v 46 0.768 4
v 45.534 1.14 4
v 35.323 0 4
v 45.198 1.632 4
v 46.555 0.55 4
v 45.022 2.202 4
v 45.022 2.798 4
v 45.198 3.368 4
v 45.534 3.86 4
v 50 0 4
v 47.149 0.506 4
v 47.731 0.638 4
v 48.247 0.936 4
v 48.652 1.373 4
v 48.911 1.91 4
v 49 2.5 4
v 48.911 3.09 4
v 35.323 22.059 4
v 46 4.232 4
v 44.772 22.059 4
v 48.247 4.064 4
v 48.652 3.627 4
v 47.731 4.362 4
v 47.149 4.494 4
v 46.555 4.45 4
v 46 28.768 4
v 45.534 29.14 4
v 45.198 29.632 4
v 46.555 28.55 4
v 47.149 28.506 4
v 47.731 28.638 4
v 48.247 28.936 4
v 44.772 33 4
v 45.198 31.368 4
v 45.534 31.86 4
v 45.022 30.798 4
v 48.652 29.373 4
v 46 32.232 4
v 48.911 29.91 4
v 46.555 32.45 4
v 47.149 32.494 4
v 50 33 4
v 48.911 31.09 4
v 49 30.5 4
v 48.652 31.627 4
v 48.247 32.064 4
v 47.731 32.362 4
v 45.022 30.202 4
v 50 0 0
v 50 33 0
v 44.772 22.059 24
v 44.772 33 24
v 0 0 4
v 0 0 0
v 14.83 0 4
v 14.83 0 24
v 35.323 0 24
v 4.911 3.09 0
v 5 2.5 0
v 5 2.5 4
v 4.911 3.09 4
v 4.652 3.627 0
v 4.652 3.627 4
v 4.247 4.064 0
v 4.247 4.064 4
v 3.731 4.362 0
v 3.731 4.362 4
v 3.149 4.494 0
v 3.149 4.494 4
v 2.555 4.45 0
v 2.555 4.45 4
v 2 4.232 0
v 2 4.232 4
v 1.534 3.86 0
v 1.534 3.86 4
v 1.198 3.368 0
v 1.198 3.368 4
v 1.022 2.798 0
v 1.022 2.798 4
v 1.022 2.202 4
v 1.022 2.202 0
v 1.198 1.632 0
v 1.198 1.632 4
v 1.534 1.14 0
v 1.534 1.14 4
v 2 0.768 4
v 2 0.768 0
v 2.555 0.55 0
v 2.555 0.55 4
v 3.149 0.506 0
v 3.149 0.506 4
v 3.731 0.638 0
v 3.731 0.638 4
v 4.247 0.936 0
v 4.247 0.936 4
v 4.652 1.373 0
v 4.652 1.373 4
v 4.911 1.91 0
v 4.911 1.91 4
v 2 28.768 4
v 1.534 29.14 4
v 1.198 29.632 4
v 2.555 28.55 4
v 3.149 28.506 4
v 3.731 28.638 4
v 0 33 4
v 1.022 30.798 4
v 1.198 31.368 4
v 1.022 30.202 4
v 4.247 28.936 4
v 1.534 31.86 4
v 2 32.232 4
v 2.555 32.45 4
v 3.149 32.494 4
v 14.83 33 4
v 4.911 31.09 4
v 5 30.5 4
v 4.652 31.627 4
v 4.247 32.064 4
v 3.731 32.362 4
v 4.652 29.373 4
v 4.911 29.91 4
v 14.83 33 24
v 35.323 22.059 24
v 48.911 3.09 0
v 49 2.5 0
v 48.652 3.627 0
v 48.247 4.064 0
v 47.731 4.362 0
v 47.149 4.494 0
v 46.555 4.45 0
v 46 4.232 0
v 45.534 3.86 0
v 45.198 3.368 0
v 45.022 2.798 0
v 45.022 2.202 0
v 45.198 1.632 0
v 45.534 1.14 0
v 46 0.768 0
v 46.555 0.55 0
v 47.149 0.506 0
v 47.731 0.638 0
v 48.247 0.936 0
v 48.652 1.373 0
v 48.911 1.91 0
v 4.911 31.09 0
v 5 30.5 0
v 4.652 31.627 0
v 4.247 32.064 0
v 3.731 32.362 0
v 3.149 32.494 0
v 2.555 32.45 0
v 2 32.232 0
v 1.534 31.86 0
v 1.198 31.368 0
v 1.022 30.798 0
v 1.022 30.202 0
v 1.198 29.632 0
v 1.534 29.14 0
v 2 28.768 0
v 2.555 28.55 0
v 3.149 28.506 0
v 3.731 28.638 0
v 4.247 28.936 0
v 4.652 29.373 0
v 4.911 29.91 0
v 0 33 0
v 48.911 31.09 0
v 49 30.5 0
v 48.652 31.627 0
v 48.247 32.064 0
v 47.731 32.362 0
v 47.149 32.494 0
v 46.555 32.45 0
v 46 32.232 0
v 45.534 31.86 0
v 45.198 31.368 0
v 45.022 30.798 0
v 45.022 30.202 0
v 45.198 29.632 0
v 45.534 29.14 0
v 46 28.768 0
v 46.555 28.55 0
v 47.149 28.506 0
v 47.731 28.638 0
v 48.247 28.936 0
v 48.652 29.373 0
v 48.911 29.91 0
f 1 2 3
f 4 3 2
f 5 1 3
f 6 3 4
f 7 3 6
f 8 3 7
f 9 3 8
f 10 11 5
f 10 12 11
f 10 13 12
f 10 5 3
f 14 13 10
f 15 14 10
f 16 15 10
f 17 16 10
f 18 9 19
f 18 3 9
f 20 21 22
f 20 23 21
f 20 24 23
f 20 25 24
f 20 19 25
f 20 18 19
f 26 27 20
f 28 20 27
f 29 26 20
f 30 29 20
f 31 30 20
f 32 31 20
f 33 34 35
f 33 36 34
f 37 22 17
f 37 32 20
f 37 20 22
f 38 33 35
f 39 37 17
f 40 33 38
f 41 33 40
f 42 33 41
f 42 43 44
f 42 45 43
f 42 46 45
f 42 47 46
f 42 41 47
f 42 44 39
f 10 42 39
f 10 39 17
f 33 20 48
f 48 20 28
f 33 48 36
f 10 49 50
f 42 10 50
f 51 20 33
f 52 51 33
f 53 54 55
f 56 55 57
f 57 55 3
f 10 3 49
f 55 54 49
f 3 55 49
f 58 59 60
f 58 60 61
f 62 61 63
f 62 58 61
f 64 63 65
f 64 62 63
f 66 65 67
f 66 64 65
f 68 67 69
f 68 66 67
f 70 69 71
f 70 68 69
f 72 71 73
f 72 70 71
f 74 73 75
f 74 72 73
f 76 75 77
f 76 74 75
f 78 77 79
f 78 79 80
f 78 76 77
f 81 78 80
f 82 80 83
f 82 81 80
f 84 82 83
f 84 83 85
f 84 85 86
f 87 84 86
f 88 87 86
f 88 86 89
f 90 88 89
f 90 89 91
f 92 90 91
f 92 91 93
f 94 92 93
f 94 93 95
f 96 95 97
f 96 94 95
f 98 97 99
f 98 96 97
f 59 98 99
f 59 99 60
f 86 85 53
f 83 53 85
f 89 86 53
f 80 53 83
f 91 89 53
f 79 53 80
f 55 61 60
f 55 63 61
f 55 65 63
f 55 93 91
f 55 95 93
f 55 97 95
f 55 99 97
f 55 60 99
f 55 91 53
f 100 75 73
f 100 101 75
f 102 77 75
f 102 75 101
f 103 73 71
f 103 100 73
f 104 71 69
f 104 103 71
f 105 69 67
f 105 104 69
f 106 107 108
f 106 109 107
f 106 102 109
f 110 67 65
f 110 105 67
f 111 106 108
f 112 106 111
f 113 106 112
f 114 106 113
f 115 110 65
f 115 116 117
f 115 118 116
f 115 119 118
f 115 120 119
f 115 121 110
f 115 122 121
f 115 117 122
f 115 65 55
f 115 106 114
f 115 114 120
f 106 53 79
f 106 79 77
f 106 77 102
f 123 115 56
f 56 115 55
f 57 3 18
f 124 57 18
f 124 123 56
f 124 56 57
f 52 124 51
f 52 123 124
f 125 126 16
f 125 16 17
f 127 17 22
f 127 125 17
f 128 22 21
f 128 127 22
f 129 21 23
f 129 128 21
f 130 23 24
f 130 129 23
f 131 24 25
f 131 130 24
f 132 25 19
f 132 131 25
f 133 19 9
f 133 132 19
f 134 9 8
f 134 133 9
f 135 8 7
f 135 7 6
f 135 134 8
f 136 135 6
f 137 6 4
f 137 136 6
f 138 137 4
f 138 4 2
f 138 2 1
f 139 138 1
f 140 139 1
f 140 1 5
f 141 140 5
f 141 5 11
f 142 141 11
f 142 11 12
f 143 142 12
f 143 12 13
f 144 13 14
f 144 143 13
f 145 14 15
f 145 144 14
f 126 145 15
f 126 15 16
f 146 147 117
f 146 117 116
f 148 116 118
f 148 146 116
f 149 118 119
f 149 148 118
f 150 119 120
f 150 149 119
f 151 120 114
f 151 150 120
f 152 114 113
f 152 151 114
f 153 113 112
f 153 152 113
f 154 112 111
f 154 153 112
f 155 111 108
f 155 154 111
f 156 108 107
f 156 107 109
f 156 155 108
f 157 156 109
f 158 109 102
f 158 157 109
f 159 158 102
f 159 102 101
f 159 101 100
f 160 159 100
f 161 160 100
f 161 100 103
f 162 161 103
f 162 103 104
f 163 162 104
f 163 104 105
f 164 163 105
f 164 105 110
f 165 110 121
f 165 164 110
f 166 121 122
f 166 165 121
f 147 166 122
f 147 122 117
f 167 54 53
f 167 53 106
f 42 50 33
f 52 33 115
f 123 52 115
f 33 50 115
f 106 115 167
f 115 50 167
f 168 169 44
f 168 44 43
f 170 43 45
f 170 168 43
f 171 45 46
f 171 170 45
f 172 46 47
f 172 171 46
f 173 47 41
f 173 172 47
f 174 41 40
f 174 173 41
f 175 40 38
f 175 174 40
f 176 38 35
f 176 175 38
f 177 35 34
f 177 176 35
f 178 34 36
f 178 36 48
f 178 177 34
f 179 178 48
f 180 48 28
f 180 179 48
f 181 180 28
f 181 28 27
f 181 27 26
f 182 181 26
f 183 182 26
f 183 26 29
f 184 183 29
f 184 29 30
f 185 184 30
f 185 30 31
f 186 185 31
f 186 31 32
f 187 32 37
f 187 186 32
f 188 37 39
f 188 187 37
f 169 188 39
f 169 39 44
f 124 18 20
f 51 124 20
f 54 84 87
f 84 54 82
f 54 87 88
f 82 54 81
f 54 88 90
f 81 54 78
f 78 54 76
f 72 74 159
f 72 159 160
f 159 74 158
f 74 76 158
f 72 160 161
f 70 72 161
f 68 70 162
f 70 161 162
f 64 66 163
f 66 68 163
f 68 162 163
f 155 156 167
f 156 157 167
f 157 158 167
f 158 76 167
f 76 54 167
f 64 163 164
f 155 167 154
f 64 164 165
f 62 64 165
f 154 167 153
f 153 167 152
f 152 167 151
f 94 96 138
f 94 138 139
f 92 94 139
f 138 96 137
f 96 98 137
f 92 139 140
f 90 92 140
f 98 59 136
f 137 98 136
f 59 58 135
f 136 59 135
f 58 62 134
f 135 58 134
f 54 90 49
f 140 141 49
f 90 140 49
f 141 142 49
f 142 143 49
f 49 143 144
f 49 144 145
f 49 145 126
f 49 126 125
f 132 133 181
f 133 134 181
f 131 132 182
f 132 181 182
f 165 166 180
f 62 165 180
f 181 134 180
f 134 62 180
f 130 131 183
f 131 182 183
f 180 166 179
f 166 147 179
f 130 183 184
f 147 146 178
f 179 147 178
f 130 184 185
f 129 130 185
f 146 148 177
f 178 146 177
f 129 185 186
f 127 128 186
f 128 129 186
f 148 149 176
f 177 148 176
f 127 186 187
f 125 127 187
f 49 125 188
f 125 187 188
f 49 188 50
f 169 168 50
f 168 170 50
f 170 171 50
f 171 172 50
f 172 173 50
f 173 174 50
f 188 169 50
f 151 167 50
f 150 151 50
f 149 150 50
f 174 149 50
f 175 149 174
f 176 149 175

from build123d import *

# Parameters (mm, degrees)
SKETCH1_W           = 50
SKETCH1_H           = 33
SKETCH1_R           = 2
BOSS_EXTRUDE1_DEPTH = 4
BOSS_EXTRUDE2_DEPTH = 24


with BuildPart() as part:
    # Sketch1 → Boss-Extrude1 (new body)
    with BuildSketch(Plane.XY):
        with Locations((25, 16.5)):
            Rectangle(SKETCH1_W, SKETCH1_H)
        with Locations((3, 2.5)):
            Circle(SKETCH1_R, mode=Mode.SUBTRACT)
        with Locations((3, 30.5)):
            Circle(SKETCH1_R, mode=Mode.SUBTRACT)
        with Locations((47, 2.5)):
            Circle(SKETCH1_R, mode=Mode.SUBTRACT)
        with Locations((47, 30.5)):
            Circle(SKETCH1_R, mode=Mode.SUBTRACT)
    extrude(amount=BOSS_EXTRUDE1_DEPTH)

    # Sketch1<3> → Boss-Extrude2 (add)
    with BuildSketch(Plane.XY):
        Polygon((14.829713536, 33), (14.829713536, 0), (35.322939572, 0), (35.322939572, 22.058501613), (44.771529769, 22.058501613), (44.771529769, 33), align=None)
    extrude(amount=BOSS_EXTRUDE2_DEPTH)


solid = part.part
